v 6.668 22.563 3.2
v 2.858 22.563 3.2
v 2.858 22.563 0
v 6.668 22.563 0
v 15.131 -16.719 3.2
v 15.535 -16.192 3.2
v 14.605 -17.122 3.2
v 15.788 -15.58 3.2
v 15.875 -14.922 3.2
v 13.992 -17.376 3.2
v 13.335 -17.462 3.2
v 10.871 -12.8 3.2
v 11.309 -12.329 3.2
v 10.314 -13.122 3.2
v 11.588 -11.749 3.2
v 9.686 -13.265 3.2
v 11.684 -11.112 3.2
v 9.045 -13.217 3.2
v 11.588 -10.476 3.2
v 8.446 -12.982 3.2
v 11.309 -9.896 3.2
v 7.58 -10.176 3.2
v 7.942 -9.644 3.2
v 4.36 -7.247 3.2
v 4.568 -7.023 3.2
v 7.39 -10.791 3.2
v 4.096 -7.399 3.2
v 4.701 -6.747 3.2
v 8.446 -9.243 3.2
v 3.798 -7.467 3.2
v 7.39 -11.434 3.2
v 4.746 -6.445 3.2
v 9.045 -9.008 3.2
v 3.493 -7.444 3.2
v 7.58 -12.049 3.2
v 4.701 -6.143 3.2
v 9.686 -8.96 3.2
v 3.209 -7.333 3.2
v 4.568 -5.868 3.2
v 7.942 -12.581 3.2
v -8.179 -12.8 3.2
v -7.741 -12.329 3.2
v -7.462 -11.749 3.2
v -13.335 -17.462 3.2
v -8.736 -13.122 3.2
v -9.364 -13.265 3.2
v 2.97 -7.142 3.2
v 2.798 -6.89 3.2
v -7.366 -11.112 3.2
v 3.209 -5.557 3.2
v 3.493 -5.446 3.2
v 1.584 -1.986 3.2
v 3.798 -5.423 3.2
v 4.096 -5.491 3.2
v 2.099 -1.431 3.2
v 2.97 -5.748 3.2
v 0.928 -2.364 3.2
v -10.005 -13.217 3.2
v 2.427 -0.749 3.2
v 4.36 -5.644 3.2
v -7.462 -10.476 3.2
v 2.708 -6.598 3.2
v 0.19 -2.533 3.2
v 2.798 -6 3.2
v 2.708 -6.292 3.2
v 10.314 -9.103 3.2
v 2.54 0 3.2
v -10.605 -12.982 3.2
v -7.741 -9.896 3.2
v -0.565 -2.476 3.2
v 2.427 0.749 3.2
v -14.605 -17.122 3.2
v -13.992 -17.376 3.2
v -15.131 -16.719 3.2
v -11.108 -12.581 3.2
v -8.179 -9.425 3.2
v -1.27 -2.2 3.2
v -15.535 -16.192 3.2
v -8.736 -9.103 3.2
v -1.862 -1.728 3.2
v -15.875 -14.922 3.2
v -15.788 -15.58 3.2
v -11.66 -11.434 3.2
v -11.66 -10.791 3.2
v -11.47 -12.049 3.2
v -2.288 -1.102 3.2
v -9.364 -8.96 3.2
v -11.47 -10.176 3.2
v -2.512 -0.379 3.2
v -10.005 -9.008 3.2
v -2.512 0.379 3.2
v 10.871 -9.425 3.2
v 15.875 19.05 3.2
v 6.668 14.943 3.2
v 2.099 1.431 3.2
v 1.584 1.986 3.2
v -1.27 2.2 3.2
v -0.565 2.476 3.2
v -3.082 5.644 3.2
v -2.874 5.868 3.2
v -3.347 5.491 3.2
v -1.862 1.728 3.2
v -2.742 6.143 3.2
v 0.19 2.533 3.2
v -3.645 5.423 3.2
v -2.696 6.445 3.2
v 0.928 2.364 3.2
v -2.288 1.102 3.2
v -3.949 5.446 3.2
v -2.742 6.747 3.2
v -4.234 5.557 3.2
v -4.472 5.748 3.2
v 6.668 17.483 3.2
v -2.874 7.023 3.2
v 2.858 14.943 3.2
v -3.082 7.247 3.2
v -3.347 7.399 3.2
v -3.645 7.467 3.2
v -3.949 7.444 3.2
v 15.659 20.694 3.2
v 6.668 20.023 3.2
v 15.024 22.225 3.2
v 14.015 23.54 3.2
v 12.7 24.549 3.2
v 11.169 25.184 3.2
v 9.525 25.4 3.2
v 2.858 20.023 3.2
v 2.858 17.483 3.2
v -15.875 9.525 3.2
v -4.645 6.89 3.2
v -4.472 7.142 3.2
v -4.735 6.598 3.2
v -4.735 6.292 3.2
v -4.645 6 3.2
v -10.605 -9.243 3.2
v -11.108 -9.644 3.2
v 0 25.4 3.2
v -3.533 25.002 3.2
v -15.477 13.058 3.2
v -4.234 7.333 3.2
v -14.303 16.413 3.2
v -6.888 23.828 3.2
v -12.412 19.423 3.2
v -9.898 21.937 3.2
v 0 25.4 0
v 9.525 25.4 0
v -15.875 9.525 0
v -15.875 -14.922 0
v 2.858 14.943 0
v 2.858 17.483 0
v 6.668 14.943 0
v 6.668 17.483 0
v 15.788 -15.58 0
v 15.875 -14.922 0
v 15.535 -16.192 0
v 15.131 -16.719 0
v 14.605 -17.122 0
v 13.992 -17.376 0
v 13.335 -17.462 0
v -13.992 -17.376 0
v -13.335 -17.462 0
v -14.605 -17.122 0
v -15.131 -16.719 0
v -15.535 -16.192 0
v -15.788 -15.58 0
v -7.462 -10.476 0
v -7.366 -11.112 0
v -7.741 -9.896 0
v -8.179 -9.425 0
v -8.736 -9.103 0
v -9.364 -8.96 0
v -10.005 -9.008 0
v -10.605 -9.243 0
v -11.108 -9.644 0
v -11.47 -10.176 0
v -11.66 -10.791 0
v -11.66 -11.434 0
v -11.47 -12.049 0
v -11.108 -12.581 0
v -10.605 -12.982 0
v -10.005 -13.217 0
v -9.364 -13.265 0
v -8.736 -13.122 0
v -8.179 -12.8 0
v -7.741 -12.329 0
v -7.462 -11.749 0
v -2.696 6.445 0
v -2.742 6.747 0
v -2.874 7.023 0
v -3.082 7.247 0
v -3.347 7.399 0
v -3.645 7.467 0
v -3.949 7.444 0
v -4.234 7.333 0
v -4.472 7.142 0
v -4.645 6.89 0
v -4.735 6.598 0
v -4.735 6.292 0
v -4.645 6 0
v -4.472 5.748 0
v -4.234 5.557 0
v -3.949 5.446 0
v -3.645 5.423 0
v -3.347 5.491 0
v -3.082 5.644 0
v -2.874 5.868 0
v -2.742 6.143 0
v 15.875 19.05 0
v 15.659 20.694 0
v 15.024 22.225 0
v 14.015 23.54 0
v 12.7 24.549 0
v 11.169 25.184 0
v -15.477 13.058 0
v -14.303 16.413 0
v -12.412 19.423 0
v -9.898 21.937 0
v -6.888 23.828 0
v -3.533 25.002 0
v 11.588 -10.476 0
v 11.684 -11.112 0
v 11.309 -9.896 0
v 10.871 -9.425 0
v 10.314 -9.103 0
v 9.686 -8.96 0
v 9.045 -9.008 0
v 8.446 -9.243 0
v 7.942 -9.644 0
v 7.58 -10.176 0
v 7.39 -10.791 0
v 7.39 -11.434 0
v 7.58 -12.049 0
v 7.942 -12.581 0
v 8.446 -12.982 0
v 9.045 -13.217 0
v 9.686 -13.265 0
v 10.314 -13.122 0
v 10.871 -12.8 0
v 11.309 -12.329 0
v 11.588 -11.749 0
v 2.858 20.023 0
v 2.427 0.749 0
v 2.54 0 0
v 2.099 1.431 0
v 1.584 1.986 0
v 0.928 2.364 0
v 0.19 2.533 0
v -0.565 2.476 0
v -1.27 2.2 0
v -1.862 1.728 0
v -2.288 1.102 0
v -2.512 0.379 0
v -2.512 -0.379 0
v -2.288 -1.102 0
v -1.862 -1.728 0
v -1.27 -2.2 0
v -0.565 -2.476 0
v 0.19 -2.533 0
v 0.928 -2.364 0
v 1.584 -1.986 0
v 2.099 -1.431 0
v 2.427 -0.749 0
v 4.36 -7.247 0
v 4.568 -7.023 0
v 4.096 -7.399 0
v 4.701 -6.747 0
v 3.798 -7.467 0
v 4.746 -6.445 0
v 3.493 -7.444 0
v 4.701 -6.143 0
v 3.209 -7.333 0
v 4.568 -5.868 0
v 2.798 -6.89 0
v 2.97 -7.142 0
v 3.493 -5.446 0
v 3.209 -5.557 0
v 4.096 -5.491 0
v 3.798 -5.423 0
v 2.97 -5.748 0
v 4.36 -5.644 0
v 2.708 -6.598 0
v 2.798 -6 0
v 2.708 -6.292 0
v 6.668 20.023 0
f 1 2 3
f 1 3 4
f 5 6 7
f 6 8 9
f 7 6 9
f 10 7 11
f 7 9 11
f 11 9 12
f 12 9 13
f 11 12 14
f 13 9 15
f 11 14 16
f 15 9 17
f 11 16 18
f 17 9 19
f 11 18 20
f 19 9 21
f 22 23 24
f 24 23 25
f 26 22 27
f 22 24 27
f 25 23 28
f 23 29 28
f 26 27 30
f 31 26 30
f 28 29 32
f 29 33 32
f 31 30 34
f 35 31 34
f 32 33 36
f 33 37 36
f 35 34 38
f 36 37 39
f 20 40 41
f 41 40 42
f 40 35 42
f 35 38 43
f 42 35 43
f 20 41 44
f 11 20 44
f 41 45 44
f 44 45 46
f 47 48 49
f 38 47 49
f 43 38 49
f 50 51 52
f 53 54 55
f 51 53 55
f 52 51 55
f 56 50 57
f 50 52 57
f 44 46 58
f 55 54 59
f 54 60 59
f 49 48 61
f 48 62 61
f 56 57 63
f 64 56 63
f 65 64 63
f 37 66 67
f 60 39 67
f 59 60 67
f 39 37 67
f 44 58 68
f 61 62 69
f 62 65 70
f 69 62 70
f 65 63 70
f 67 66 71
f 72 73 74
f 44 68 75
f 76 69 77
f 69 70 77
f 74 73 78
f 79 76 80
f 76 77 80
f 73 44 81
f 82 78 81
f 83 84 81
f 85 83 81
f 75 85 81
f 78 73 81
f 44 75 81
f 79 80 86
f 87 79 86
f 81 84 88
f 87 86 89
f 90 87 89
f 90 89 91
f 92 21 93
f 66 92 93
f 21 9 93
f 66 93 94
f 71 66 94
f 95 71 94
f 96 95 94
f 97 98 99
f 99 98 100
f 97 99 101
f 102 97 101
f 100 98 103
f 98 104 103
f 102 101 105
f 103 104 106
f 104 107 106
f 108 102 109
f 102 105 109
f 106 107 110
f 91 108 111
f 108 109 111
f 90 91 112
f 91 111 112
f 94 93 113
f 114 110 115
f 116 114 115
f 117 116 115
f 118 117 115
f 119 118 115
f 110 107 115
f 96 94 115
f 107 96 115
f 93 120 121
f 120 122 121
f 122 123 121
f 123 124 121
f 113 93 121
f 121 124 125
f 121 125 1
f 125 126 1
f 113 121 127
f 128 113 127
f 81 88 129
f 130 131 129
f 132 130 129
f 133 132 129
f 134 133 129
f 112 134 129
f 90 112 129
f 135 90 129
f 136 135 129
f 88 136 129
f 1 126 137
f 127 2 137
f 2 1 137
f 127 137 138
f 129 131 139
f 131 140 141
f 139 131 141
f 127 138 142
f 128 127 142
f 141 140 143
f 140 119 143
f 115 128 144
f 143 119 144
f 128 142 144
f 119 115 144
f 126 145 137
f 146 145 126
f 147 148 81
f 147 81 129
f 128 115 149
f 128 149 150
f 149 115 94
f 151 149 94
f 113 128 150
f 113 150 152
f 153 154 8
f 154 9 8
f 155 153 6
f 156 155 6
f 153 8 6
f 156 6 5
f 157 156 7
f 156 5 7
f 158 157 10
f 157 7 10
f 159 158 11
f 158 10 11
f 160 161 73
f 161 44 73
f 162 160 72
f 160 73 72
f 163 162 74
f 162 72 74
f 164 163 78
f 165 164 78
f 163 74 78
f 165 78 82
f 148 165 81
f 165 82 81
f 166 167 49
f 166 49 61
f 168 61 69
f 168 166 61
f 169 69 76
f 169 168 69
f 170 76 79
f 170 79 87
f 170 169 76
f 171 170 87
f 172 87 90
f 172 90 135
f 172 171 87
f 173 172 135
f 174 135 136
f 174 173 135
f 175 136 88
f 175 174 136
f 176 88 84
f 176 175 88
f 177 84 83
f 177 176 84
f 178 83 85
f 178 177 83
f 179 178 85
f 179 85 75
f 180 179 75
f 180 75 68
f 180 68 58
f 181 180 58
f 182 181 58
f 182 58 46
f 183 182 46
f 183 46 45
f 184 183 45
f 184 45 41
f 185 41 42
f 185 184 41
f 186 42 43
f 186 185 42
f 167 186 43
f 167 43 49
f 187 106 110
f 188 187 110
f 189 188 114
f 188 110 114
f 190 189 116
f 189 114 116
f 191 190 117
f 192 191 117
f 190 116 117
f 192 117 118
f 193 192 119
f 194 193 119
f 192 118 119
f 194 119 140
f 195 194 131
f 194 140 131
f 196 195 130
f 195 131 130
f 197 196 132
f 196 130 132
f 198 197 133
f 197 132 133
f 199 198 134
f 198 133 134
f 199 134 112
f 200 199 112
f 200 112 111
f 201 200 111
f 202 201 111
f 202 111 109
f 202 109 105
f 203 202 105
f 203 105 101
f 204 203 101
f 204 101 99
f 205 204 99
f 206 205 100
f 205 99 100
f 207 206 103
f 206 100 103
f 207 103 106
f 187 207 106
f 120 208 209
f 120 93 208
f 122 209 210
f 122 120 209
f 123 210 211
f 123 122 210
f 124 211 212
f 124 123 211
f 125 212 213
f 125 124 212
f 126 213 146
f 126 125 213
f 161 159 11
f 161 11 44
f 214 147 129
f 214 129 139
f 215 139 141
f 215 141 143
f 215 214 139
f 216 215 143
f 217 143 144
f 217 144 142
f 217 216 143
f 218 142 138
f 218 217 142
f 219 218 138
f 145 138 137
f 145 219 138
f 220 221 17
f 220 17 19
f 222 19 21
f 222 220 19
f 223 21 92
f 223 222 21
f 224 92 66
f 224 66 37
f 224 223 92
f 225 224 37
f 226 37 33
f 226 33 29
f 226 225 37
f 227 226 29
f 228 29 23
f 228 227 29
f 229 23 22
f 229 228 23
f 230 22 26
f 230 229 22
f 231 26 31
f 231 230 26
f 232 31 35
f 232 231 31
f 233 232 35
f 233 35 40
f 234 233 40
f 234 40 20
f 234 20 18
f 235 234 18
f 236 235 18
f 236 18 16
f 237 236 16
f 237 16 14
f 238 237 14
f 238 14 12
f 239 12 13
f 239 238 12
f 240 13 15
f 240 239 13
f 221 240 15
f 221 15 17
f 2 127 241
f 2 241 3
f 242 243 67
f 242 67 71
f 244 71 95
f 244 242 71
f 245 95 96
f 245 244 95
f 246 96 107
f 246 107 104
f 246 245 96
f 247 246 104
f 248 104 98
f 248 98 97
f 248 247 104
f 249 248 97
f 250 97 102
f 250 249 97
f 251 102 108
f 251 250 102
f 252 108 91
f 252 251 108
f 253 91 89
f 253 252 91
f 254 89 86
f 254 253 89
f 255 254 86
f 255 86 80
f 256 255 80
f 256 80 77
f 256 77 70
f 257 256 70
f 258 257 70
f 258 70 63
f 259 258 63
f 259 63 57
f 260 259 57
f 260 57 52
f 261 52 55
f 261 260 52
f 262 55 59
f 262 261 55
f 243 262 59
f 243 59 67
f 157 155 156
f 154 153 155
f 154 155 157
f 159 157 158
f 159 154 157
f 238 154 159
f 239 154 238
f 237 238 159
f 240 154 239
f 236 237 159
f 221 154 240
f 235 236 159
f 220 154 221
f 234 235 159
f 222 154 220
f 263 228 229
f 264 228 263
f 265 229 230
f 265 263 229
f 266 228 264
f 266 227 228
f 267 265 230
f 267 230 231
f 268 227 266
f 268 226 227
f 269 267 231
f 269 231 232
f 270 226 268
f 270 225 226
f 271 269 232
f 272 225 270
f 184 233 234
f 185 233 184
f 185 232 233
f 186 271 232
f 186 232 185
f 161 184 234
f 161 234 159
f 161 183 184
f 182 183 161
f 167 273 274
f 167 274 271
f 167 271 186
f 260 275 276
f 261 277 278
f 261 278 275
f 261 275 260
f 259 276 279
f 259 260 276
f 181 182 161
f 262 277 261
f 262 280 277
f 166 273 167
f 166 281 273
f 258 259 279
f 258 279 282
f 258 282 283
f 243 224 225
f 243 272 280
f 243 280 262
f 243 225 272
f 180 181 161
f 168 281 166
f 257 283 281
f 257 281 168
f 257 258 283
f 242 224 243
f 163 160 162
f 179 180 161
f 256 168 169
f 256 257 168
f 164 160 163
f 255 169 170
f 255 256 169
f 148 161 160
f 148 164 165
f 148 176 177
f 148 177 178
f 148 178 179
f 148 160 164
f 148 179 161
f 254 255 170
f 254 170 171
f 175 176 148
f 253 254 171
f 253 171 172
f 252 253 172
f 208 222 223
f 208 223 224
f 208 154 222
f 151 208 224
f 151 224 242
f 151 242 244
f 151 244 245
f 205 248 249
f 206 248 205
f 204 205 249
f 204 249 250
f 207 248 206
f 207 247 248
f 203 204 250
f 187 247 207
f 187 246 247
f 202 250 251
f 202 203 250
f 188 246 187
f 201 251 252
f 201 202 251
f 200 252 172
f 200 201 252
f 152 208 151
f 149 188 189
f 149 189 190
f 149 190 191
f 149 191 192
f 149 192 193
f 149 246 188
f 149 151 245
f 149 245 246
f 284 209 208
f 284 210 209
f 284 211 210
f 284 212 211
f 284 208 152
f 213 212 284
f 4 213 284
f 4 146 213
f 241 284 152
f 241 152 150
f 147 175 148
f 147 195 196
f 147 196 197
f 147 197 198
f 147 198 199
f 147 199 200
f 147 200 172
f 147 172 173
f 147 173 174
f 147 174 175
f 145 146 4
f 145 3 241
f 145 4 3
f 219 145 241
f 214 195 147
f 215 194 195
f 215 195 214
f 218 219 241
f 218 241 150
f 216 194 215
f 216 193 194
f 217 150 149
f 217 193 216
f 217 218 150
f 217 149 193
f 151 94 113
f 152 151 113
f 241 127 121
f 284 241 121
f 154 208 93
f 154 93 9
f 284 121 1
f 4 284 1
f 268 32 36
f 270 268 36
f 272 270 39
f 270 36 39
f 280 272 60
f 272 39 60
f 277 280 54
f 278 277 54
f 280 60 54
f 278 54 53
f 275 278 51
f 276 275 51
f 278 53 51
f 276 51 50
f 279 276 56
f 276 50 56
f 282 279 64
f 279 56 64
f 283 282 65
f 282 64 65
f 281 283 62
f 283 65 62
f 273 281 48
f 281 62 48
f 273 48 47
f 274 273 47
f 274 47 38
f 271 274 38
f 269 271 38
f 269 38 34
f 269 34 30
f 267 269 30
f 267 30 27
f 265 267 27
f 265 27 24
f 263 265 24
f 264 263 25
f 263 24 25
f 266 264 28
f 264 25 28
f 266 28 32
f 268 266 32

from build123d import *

# Parameters (mm, degrees)
SKETCH1_R           = 2.54
SKETCH1_R_2         = 2.159
BOSS_EXTRUDE1_DEPTH = 3.2004
FILLET1_R           = 6.35
FILLET2_R           = 2.54
SKETCH2_R           = 1.025
CUT_EXTRUDE1_DEPTH  = 3.2004
SKETCH3_W           = 3.81
SKETCH3_H           = 2.54
CUT_EXTRUDE2_DEPTH  = 3.2004


with BuildPart() as part:
    # Sketch1 → Boss-Extrude1 (new body)
    with BuildSketch(Plane.XY):
        with BuildLine():
            Line((15.875, 25.4), (15.875, 9.525))
            Line((15.875, 9.525), (15.875, -17.4625))
            Line((15.875, -17.4625), (-15.875, -17.4625))
            Line((-15.875, -17.4625), (-15.875, 9.525))
            ThreePointArc((-15.875, 9.525), (-11.225320151, 20.750320151), (0, 25.4))
            Line((0, 25.4), (15.875, 25.4))
        make_face()
        Circle(SKETCH1_R, mode=Mode.SUBTRACT)
        with Locations((-9.525, -11.1125)):
            Circle(SKETCH1_R_2, mode=Mode.SUBTRACT)
        with Locations((9.525, -11.1125)):
            Circle(SKETCH1_R_2, mode=Mode.SUBTRACT)
    extrude(amount=BOSS_EXTRUDE1_DEPTH)

    # Fillet1
    fillet1_edges = [part.edges().sort_by_distance(p)[0] for p in [
        (15.875, 25.4, 1.6002),
    ]]
    fillet(fillet1_edges, radius=FILLET1_R)

    # Fillet2
    fillet2_edges = [part.edges().sort_by_distance(p)[0] for p in [
        (15.875, -17.4625, 1.6002),
        (-15.875, -17.4625, 1.6002),
    ]]
    fillet(fillet2_edges, radius=FILLET2_R)

    # Sketch2 → Cut-Extrude1 (cut)
    with BuildSketch(Plane.XY.offset(3.2004)):
        with Locations((-3.7211, 6.44513426)):
            Circle(SKETCH2_R)
        with Locations((3.7211, -6.44513426)):
            Circle(SKETCH2_R)
    extrude(amount=-CUT_EXTRUDE1_DEPTH, mode=Mode.SUBTRACT)

    # Sketch3 → Cut-Extrude2 (cut)
    with BuildSketch(Plane.XY.offset(3.2004)):
        with Locations((4.7625, 21.292785454)):
            Rectangle(SKETCH3_W, SKETCH3_H)
        with Locations((4.7625, 16.212785454)):
            Rectangle(SKETCH3_W, SKETCH3_H)
    extrude(amount=-CUT_EXTRUDE2_DEPTH, mode=Mode.SUBTRACT)


solid = part.part
